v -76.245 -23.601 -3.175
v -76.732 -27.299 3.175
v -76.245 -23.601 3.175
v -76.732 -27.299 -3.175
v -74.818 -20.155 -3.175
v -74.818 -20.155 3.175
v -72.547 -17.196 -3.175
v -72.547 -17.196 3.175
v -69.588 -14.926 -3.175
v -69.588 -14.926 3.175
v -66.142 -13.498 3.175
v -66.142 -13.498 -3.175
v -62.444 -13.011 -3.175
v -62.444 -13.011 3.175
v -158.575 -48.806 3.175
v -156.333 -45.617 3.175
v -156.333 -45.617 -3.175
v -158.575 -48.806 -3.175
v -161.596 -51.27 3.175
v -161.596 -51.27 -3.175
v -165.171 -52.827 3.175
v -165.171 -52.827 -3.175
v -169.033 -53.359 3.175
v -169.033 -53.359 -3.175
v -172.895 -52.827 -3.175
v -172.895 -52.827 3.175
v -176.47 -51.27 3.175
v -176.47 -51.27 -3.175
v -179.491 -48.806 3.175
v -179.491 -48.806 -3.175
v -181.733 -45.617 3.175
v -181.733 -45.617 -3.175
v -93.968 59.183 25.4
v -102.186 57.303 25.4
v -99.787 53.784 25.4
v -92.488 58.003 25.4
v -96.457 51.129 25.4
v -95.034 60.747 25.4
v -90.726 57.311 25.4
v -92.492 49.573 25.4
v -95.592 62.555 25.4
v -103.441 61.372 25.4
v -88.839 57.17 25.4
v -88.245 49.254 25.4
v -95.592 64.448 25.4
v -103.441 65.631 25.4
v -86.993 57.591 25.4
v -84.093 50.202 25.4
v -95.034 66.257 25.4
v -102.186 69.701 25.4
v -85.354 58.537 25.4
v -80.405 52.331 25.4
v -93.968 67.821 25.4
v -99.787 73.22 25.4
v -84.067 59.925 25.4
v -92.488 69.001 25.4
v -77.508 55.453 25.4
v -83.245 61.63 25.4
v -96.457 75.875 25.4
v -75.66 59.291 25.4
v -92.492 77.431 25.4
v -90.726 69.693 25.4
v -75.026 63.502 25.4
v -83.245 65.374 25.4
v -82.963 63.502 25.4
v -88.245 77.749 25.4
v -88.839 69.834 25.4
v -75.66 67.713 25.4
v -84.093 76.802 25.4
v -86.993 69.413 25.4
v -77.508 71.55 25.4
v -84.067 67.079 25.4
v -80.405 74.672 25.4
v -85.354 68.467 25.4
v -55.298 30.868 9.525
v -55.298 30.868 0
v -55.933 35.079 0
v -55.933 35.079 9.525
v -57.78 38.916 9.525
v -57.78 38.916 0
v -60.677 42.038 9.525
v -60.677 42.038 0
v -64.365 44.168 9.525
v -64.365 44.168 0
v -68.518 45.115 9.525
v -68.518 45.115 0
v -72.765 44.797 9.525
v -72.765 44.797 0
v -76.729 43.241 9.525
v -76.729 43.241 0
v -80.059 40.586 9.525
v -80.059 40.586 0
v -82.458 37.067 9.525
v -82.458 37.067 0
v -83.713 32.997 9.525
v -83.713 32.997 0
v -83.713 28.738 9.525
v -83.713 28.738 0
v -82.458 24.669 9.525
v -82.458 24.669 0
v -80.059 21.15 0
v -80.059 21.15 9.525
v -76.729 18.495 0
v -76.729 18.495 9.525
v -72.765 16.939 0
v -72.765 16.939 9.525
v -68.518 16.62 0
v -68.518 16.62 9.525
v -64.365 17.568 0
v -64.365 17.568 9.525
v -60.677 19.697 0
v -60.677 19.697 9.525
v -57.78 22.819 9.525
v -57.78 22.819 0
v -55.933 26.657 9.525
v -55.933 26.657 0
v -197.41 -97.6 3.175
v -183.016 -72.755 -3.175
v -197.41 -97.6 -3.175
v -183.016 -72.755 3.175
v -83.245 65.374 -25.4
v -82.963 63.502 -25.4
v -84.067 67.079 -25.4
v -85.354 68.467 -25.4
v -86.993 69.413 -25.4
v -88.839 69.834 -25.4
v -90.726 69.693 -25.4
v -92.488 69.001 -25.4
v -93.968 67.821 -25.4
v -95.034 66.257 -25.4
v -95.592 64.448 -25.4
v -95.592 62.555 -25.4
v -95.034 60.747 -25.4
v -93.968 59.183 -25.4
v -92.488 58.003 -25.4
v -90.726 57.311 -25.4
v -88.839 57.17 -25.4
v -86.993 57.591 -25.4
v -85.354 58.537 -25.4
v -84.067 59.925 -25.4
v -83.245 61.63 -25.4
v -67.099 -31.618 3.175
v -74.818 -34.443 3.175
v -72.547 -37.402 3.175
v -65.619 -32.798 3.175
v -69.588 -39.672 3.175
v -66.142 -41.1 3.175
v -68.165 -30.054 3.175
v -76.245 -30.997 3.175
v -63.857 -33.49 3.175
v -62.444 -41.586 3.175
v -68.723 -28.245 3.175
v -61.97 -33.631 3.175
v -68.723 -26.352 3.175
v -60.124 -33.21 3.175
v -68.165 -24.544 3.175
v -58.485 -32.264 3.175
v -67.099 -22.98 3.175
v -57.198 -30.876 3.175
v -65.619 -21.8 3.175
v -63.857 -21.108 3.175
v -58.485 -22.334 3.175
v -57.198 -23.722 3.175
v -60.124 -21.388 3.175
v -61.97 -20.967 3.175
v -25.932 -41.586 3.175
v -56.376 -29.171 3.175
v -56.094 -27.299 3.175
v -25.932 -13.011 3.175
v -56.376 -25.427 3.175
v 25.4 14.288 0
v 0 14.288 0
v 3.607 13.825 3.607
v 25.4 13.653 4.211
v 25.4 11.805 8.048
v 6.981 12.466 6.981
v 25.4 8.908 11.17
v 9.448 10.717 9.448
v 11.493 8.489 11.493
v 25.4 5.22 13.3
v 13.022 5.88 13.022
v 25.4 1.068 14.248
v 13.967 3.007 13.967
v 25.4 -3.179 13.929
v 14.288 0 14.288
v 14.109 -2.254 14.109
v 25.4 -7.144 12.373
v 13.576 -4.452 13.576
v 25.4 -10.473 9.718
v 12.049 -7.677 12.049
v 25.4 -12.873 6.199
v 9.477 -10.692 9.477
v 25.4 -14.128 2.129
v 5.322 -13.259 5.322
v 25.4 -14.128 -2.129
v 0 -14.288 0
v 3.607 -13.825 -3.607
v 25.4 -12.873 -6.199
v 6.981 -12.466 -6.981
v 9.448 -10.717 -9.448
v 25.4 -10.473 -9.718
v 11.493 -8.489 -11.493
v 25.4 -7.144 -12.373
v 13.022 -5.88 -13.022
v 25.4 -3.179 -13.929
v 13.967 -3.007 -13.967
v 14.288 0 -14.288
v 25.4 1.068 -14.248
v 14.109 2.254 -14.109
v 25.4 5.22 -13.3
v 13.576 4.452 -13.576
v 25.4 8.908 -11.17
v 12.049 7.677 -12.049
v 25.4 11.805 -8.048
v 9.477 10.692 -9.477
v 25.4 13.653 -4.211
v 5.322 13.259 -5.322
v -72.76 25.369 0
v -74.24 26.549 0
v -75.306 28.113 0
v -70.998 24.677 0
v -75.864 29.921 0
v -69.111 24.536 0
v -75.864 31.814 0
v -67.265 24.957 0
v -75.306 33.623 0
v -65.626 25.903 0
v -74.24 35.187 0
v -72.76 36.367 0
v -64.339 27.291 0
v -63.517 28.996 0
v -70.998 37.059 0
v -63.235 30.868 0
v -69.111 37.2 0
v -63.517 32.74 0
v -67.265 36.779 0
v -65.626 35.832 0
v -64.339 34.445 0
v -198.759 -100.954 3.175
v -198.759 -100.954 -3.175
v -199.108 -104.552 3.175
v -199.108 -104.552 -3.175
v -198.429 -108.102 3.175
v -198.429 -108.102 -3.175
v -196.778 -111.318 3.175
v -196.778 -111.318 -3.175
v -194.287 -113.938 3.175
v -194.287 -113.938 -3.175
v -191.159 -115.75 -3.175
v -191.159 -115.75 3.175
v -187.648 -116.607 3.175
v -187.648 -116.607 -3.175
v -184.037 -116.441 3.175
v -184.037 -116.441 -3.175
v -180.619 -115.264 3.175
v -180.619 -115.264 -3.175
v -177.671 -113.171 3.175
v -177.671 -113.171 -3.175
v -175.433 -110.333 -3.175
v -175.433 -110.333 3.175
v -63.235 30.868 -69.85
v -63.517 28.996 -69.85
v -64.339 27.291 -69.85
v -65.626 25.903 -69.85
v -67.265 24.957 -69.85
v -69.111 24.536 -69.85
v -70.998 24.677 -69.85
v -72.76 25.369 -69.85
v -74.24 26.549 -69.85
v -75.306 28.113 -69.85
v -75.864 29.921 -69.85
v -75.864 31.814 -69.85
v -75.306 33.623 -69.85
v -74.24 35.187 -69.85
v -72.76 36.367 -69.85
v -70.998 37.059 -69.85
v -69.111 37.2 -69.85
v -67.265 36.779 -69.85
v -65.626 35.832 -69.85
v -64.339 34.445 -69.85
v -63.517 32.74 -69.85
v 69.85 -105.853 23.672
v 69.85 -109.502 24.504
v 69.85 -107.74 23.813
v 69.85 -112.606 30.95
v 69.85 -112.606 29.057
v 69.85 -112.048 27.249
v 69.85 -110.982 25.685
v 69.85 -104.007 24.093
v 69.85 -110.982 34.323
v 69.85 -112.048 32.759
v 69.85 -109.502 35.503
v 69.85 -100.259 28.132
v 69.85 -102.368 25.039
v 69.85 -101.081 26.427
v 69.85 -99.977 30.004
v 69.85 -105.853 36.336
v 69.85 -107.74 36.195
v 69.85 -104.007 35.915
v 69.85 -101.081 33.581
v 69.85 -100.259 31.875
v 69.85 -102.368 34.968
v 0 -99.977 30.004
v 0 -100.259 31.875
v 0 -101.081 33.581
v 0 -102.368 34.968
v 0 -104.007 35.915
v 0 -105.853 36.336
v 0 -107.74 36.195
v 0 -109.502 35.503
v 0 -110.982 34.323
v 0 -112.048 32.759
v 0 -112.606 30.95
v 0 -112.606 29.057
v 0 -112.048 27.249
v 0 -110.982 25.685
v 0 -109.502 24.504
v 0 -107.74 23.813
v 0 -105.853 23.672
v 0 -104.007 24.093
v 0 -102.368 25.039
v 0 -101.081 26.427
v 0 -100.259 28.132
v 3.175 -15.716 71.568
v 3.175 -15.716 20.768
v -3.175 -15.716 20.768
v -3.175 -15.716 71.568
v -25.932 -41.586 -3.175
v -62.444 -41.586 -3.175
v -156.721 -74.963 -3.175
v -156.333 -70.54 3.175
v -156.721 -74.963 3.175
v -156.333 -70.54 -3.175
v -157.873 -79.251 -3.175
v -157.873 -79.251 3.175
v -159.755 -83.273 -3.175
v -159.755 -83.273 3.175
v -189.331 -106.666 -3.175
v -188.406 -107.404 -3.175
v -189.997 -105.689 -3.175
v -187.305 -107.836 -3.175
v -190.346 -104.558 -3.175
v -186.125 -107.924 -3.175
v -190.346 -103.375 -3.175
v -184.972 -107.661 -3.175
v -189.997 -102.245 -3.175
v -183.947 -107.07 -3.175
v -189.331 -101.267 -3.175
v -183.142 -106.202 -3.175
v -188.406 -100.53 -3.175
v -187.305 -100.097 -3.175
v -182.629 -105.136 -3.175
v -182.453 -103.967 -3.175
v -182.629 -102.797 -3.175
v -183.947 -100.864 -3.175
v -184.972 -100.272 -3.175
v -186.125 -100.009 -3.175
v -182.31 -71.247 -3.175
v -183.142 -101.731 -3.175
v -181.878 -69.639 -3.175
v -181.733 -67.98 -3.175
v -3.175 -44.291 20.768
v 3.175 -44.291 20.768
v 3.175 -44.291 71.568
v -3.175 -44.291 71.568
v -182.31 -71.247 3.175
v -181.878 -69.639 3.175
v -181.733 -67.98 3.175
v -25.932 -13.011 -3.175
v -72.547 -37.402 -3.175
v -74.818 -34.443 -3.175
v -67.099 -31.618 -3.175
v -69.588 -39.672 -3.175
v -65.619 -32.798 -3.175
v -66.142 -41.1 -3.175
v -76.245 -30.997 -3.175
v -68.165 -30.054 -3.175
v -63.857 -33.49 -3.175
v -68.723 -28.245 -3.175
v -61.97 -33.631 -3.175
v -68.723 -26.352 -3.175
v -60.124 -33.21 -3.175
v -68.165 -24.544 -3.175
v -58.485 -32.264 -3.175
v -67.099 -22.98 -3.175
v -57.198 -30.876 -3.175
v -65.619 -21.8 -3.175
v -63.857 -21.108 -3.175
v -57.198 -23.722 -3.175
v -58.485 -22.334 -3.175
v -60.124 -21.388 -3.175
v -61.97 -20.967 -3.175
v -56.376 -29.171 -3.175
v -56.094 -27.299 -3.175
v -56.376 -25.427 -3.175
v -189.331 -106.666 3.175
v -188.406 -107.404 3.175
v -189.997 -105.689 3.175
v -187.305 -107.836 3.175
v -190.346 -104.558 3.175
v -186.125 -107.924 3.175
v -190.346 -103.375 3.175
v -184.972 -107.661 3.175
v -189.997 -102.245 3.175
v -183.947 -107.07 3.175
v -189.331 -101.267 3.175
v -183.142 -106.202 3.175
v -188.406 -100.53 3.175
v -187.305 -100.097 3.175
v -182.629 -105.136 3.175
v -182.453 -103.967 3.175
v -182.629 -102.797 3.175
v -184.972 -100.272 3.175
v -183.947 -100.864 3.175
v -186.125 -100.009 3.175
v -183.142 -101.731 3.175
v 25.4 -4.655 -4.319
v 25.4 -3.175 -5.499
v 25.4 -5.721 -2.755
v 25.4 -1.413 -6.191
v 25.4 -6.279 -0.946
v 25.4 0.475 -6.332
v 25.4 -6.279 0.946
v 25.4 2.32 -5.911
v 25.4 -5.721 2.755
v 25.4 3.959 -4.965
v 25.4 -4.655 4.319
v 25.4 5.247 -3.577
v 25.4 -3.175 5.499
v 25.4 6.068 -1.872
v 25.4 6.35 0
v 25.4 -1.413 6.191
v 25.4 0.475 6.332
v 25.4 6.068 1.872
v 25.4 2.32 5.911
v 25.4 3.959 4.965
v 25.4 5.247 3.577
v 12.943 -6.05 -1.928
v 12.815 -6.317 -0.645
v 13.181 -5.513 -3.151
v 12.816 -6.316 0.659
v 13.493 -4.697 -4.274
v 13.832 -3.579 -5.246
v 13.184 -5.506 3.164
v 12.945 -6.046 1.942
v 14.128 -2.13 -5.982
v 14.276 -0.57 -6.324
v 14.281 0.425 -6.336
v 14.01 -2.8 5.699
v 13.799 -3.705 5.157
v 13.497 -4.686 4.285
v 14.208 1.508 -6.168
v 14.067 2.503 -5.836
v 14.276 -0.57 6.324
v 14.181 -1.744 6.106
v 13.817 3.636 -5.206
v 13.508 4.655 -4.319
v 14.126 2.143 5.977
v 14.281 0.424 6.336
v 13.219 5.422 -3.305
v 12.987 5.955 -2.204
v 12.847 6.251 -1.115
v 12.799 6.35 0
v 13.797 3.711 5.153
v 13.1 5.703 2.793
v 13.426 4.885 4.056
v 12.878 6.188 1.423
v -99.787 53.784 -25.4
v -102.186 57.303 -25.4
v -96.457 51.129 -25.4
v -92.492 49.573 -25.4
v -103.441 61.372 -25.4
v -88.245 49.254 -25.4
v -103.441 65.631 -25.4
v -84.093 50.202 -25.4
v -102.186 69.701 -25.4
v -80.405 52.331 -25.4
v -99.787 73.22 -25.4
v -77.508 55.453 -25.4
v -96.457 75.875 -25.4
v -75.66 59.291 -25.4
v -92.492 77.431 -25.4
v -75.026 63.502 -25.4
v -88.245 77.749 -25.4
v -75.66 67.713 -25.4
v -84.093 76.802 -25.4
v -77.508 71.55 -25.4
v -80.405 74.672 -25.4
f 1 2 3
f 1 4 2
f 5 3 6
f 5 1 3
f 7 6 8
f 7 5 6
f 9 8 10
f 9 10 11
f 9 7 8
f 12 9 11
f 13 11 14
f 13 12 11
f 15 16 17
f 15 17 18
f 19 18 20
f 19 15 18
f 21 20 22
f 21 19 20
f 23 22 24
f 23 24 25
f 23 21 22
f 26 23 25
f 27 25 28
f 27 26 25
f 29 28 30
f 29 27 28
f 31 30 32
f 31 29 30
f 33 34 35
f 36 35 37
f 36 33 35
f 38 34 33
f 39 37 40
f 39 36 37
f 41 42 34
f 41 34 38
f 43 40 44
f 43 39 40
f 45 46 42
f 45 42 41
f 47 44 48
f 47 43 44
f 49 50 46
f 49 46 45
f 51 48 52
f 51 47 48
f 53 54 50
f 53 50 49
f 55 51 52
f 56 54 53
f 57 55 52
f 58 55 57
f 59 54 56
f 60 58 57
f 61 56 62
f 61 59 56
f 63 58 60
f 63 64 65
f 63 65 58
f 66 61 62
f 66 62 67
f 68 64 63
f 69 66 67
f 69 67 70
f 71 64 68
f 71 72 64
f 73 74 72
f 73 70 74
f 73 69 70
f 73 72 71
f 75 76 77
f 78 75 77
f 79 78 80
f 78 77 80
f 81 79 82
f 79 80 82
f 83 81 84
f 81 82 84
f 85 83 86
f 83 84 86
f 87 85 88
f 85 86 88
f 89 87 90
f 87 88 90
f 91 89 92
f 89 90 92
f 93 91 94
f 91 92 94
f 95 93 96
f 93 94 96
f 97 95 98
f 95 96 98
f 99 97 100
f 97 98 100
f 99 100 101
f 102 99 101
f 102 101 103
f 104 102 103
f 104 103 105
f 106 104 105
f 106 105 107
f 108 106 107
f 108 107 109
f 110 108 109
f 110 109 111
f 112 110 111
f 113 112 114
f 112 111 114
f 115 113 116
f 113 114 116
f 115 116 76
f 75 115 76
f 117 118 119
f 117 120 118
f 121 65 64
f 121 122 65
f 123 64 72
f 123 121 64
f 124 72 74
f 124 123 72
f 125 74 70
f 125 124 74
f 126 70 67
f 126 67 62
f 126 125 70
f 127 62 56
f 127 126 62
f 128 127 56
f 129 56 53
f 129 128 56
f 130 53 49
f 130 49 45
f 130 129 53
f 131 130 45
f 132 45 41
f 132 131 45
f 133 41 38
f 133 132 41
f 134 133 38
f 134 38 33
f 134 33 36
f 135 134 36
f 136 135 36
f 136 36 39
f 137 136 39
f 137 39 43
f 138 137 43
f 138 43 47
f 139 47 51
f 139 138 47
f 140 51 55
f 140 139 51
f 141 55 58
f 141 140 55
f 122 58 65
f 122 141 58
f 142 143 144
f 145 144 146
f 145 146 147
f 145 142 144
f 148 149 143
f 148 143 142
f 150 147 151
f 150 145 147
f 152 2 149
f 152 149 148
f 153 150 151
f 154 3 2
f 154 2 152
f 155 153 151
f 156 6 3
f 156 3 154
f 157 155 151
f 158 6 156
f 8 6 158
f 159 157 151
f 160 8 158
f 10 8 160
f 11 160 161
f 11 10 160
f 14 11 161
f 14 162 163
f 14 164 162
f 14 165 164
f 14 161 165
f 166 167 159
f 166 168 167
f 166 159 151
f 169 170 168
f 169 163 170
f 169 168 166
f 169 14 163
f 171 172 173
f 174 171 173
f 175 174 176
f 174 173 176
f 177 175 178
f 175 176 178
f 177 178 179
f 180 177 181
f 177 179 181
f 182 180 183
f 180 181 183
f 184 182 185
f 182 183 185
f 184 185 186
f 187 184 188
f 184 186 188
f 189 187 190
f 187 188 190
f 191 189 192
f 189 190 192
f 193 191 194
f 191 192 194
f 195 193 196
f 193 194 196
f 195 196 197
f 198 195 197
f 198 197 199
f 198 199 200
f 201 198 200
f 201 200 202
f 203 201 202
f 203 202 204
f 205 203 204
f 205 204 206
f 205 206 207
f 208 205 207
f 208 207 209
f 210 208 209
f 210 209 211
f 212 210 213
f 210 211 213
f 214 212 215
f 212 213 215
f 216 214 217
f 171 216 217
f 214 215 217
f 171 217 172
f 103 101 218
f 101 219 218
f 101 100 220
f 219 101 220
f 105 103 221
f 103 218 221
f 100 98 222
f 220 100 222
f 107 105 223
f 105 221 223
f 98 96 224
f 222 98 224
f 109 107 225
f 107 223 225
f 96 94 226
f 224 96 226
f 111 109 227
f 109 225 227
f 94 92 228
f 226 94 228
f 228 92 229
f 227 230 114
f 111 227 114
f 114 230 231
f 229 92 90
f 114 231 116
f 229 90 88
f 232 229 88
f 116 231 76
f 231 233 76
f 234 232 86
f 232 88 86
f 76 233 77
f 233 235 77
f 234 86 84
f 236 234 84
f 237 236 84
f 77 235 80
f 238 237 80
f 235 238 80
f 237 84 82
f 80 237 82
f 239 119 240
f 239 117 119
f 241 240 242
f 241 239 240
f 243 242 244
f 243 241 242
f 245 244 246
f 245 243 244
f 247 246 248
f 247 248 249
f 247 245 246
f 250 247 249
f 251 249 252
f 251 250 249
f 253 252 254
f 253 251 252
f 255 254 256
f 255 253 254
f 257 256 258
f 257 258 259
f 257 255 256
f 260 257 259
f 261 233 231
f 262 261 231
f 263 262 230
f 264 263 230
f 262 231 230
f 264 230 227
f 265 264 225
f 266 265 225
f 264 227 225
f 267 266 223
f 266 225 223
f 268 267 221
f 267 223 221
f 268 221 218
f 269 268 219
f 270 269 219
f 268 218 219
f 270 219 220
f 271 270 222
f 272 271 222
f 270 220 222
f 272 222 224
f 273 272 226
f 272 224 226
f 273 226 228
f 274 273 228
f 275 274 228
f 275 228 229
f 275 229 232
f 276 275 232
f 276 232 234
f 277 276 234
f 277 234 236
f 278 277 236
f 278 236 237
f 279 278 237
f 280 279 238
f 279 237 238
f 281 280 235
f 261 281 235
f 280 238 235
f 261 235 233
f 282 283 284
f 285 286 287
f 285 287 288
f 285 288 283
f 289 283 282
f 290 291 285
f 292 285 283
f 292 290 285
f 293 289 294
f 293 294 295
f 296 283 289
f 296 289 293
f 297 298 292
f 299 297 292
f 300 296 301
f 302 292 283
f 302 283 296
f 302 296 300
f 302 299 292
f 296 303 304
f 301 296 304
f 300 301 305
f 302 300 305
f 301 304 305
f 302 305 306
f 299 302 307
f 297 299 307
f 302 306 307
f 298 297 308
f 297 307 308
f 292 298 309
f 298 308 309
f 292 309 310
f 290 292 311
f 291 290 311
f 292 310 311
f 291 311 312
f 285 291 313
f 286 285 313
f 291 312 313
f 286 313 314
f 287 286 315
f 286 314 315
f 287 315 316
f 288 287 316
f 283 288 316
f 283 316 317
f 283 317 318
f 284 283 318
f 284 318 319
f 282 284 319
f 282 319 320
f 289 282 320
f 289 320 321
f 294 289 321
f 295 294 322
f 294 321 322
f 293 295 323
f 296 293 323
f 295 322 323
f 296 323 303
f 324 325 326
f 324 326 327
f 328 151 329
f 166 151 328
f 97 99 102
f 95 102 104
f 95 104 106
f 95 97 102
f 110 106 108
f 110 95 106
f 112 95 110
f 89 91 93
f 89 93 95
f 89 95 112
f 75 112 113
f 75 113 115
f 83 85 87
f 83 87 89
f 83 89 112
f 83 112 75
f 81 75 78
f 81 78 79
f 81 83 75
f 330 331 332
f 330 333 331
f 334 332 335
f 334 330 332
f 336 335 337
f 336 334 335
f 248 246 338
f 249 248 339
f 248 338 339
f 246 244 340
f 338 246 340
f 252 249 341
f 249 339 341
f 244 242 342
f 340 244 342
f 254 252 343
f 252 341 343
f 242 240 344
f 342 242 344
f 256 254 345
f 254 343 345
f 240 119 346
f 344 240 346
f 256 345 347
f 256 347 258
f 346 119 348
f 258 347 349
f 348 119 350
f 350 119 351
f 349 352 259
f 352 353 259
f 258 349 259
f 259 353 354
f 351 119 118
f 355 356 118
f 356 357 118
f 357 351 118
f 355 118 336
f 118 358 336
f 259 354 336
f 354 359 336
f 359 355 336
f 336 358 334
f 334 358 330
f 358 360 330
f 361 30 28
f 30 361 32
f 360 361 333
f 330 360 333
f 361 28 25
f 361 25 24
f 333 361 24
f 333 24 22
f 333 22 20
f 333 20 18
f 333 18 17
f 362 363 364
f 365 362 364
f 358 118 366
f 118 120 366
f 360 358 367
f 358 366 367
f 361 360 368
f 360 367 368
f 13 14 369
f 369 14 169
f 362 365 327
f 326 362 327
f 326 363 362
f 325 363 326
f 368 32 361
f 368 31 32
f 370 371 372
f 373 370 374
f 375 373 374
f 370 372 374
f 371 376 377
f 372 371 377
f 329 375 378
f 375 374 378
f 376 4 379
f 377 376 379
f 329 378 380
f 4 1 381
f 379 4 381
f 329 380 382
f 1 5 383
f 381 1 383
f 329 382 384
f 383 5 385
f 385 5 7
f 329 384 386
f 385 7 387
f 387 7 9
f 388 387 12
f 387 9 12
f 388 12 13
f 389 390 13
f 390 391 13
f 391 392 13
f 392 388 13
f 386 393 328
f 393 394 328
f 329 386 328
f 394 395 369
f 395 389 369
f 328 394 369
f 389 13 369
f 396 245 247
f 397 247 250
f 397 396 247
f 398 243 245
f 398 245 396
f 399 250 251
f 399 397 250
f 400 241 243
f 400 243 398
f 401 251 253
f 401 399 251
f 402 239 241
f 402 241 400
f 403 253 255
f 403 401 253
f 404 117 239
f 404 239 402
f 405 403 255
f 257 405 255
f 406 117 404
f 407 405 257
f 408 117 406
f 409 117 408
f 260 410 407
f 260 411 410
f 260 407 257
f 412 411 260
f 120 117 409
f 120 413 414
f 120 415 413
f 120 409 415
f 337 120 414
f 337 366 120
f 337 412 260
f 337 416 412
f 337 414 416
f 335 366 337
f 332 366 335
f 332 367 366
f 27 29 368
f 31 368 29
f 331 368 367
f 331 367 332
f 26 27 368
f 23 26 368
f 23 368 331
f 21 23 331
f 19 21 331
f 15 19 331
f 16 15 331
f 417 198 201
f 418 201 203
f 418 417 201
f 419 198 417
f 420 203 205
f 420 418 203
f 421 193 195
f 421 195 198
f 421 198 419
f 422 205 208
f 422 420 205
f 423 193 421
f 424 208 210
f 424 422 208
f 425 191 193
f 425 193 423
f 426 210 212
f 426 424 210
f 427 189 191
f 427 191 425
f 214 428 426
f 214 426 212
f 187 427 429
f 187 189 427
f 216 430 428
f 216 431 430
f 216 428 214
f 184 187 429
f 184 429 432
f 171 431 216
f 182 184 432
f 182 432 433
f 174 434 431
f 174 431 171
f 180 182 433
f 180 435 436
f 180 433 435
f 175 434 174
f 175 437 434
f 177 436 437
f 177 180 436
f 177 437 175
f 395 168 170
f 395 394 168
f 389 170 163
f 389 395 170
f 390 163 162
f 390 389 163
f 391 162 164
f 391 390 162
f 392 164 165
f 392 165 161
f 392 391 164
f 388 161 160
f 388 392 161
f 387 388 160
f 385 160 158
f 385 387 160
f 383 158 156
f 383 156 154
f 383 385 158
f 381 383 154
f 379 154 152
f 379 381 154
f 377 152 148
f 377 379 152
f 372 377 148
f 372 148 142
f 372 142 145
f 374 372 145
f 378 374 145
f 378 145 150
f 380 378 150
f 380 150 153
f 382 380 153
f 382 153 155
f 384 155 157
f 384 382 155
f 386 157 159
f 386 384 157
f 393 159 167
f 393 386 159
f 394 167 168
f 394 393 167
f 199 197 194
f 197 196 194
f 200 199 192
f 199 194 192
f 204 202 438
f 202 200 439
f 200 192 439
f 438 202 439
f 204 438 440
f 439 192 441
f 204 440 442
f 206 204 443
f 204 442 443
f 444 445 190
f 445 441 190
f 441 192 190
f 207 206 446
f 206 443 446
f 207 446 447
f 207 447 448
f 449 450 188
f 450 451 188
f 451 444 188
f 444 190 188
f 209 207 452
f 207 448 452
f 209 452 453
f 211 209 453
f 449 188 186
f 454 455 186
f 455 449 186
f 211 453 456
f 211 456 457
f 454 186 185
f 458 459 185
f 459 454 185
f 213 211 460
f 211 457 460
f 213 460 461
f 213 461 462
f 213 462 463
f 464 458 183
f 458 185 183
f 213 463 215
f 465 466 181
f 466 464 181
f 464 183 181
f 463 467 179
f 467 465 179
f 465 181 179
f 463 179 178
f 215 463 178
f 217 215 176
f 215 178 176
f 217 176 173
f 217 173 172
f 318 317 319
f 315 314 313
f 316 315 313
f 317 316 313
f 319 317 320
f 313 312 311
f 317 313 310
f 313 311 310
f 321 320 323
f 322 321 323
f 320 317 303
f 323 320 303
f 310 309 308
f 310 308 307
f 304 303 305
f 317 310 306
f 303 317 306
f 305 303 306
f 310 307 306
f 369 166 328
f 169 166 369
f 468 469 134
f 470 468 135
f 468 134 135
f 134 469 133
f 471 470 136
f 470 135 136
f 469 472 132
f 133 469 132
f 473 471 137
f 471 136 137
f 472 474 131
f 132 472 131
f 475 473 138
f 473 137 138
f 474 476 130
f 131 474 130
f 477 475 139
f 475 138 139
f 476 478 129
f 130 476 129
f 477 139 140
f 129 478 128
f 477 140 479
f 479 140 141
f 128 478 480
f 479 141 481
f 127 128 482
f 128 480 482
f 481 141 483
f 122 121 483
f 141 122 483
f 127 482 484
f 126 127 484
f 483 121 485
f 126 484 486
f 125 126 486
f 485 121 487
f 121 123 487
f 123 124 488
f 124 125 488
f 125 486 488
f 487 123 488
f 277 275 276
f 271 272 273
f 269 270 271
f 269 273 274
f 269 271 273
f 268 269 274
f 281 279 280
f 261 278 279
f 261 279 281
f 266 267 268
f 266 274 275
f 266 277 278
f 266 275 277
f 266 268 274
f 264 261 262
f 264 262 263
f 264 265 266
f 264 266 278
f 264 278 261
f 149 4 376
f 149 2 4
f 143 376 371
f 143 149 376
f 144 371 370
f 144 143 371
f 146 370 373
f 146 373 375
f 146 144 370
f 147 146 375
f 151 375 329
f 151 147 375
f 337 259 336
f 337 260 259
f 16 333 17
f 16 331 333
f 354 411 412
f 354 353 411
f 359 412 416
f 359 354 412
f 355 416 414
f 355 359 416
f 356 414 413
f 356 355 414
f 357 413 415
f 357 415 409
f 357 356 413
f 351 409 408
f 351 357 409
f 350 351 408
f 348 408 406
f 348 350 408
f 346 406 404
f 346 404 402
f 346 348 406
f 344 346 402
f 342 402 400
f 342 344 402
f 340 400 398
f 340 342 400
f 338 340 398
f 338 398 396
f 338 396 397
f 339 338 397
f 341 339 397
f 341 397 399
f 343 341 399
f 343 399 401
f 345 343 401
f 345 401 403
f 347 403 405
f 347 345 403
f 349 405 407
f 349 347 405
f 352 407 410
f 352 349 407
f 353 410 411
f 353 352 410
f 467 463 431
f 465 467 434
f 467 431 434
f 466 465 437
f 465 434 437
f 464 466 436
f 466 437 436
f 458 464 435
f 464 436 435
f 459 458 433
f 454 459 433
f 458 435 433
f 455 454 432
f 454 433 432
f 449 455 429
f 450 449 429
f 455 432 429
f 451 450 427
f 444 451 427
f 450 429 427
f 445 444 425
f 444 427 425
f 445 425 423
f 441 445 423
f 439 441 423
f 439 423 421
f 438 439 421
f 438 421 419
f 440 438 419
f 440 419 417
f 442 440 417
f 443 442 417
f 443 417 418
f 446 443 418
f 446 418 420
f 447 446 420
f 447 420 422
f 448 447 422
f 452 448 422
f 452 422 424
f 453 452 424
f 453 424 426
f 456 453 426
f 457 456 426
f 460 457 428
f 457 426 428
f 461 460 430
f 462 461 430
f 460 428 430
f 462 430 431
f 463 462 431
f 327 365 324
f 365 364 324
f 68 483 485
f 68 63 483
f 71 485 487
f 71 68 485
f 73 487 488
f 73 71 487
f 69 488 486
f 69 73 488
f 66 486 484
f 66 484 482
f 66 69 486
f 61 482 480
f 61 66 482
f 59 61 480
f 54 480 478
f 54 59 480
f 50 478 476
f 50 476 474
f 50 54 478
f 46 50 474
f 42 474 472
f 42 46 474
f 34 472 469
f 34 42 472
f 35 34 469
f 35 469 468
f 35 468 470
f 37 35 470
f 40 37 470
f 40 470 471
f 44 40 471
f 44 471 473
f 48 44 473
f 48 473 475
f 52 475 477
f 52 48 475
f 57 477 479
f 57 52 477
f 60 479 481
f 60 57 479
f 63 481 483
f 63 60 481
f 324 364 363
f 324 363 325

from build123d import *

# Parameters (mm, degrees)
F0_W      = 50.8
F0_H      = 28.575
F0_R      = 6.35
F1_DEPTH  = 3.175
F2_R      = 14.28749
F3_W      = 28.575
F3_H      = 50.8
F4_DEPTH  = 3.175
F5_R      = 14.2875
F5_R_2    = 6.35
F6_DEPTH  = 25.4
F7_R      = 14.2875
F8_DEPTH  = 9.525
F9_R      = 6.35
F10_DEPTH = 69.85
F11_R     = 14.2875
F12_DEPTH = 25.4
F13_R     = 6.35
F14_DEPTH = 25.4
F15_R     = 14.2875
F16_DEPTH = 14.2875
F17_R     = 6.35
F18_DEPTH = 69.85
F19_R     = 3.96875
F20_DEPTH = 3.175
F21_R     = 9.525
F22_R     = 25.4


# Not quite as in the source:
# - a fillet or chamfer is up to 0.001 mm smaller than in the source, because OpenCascade refuses the exact size


with BuildPart() as f1:
    # F0 (on Top) → F1 (new body, symmetric)
    with BuildSketch(Plane.XY):
        with Locations((-51.3317184523, -27.2989158346)):
            Rectangle(F0_W, F0_H)
        with Locations((-62.4442184523, -27.2989158346)):
            Circle(F0_R, mode=Mode.SUBTRACT)
    extrude(amount=F1_DEPTH, both=True)

    # F2 (radius 14.2875 in the source; OpenCascade refuses exactly that, so slightly less here)
    f2_edges = [f1.edges().sort_by_distance(p)[0] for p in [
        (-76.731718, -13.011416, 0),
        (-76.731718, -41.586416, 0),
    ]]
    fillet(f2_edges, radius=F2_R)


with BuildPart() as f4:
    # F3 (on Right) → F4 (new body, symmetric)
    with BuildSketch(Plane.YZ):
        with Locations((-30.0037502311, 46.1682456261)):
            Rectangle(F3_W, F3_H)
    extrude(amount=F4_DEPTH, both=True)


with BuildPart() as f6:
    # F5 (on Top) → F6 (new body, symmetric)
    with BuildSketch(Plane.XY):
        with Locations((-89.313134551, 63.5019168258)):
            Circle(F5_R)
        with Locations((-89.313134551, 63.5019168258)):
            Circle(F5_R_2, mode=Mode.SUBTRACT)
    extrude(amount=F6_DEPTH, both=True)


with BuildPart() as f8:
    # F7 (on Top) → F8 (new body)
    with BuildSketch(Plane.XY):
        with Locations((-69.5852562785, 30.8678671718)):
            Circle(F7_R)
    extrude(amount=F8_DEPTH)

    # F9 (on face) → F10 (join)
    with BuildSketch(Plane(origin=(0, 0, 0), x_dir=(1, 0, 0), z_dir=(0, 0, -1))):
        with Locations((-69.5852562785, -30.8678671718)):
            Circle(F9_R)
    extrude(amount=F10_DEPTH)


with BuildPart() as f12:
    # F11 (on Right) → F12 (new body)
    with BuildSketch(Plane.YZ):
        Circle(F11_R)
    extrude(amount=F12_DEPTH)

    # F13 (on face) → F14 (cut)
    with BuildSketch(Plane.YZ.offset(25.4)):
        Circle(F13_R)
    extrude(amount=-F14_DEPTH, mode=Mode.SUBTRACT)

    # F15 (on Top) → F16 (cut, symmetric)
    with BuildSketch(Plane.XY):
        Circle(F15_R)
    extrude(amount=F16_DEPTH, both=True, mode=Mode.SUBTRACT)


with BuildPart() as f18:
    # F17 (on Right) → F18 (new body)
    with BuildSketch(Plane.YZ):
        with Locations((-106.3271164894, 30.0037506968)):
            Circle(F17_R)
    extrude(amount=F18_DEPTH)


with BuildPart() as f20:
    # F19 (on Top) → F20 (new body, symmetric)
    with BuildSketch(Plane.XY):
        with BuildLine():
            Line((-156.3327515507, -77.3665141275), (-156.3327515507, -45.6165141275))
            ThreePointArc((-156.3327515507, -45.6165141275), (-169.0327515507, -53.3585839468), (-181.7327515507, -45.6165141275))
            Line((-181.7327515507, -45.6165141275), (-181.7327515507, -70.5400470396))
            Line((-181.7327515507, -70.5400470396), (-197.4103956987, -97.6000790939))
            ThreePointArc((-197.4103956987, -97.6000790939), (-198.6936811958, -107.2351542289), (-192.7880741077, -114.9556010713))
            ThreePointArc((-192.7880741077, -114.9556010713), (-183.1529989726, -116.2388865683), (-175.4325521302, -110.3332794802))
            Line((-175.4325521302, -110.3332794802), (-156.3327515507, -77.3665141275))
        make_face()
        with Locations((-186.4214739145, -103.966679287)):
            Circle(F19_R, mode=Mode.SUBTRACT)
    extrude(amount=F20_DEPTH, both=True)

    # F21
    f21_edges = [f20.edges().sort_by_distance(p)[0] for p in [
        (-181.732752, -70.540047, -1.5875),
        (-181.732752, -70.540047, 1.5875),
    ]]
    fillet(f21_edges, radius=F21_R)

    # F22
    f22_edges = [f20.edges().sort_by_distance(p)[0] for p in [
        (-156.332752, -77.366514, -1.5875),
        (-156.332752, -77.366514, 1.5875),
    ]]
    fillet(f22_edges, radius=F22_R)


solid = Compound([f1.part, f4.part, f6.part, f8.part, f12.part, f18.part, f20.part])
